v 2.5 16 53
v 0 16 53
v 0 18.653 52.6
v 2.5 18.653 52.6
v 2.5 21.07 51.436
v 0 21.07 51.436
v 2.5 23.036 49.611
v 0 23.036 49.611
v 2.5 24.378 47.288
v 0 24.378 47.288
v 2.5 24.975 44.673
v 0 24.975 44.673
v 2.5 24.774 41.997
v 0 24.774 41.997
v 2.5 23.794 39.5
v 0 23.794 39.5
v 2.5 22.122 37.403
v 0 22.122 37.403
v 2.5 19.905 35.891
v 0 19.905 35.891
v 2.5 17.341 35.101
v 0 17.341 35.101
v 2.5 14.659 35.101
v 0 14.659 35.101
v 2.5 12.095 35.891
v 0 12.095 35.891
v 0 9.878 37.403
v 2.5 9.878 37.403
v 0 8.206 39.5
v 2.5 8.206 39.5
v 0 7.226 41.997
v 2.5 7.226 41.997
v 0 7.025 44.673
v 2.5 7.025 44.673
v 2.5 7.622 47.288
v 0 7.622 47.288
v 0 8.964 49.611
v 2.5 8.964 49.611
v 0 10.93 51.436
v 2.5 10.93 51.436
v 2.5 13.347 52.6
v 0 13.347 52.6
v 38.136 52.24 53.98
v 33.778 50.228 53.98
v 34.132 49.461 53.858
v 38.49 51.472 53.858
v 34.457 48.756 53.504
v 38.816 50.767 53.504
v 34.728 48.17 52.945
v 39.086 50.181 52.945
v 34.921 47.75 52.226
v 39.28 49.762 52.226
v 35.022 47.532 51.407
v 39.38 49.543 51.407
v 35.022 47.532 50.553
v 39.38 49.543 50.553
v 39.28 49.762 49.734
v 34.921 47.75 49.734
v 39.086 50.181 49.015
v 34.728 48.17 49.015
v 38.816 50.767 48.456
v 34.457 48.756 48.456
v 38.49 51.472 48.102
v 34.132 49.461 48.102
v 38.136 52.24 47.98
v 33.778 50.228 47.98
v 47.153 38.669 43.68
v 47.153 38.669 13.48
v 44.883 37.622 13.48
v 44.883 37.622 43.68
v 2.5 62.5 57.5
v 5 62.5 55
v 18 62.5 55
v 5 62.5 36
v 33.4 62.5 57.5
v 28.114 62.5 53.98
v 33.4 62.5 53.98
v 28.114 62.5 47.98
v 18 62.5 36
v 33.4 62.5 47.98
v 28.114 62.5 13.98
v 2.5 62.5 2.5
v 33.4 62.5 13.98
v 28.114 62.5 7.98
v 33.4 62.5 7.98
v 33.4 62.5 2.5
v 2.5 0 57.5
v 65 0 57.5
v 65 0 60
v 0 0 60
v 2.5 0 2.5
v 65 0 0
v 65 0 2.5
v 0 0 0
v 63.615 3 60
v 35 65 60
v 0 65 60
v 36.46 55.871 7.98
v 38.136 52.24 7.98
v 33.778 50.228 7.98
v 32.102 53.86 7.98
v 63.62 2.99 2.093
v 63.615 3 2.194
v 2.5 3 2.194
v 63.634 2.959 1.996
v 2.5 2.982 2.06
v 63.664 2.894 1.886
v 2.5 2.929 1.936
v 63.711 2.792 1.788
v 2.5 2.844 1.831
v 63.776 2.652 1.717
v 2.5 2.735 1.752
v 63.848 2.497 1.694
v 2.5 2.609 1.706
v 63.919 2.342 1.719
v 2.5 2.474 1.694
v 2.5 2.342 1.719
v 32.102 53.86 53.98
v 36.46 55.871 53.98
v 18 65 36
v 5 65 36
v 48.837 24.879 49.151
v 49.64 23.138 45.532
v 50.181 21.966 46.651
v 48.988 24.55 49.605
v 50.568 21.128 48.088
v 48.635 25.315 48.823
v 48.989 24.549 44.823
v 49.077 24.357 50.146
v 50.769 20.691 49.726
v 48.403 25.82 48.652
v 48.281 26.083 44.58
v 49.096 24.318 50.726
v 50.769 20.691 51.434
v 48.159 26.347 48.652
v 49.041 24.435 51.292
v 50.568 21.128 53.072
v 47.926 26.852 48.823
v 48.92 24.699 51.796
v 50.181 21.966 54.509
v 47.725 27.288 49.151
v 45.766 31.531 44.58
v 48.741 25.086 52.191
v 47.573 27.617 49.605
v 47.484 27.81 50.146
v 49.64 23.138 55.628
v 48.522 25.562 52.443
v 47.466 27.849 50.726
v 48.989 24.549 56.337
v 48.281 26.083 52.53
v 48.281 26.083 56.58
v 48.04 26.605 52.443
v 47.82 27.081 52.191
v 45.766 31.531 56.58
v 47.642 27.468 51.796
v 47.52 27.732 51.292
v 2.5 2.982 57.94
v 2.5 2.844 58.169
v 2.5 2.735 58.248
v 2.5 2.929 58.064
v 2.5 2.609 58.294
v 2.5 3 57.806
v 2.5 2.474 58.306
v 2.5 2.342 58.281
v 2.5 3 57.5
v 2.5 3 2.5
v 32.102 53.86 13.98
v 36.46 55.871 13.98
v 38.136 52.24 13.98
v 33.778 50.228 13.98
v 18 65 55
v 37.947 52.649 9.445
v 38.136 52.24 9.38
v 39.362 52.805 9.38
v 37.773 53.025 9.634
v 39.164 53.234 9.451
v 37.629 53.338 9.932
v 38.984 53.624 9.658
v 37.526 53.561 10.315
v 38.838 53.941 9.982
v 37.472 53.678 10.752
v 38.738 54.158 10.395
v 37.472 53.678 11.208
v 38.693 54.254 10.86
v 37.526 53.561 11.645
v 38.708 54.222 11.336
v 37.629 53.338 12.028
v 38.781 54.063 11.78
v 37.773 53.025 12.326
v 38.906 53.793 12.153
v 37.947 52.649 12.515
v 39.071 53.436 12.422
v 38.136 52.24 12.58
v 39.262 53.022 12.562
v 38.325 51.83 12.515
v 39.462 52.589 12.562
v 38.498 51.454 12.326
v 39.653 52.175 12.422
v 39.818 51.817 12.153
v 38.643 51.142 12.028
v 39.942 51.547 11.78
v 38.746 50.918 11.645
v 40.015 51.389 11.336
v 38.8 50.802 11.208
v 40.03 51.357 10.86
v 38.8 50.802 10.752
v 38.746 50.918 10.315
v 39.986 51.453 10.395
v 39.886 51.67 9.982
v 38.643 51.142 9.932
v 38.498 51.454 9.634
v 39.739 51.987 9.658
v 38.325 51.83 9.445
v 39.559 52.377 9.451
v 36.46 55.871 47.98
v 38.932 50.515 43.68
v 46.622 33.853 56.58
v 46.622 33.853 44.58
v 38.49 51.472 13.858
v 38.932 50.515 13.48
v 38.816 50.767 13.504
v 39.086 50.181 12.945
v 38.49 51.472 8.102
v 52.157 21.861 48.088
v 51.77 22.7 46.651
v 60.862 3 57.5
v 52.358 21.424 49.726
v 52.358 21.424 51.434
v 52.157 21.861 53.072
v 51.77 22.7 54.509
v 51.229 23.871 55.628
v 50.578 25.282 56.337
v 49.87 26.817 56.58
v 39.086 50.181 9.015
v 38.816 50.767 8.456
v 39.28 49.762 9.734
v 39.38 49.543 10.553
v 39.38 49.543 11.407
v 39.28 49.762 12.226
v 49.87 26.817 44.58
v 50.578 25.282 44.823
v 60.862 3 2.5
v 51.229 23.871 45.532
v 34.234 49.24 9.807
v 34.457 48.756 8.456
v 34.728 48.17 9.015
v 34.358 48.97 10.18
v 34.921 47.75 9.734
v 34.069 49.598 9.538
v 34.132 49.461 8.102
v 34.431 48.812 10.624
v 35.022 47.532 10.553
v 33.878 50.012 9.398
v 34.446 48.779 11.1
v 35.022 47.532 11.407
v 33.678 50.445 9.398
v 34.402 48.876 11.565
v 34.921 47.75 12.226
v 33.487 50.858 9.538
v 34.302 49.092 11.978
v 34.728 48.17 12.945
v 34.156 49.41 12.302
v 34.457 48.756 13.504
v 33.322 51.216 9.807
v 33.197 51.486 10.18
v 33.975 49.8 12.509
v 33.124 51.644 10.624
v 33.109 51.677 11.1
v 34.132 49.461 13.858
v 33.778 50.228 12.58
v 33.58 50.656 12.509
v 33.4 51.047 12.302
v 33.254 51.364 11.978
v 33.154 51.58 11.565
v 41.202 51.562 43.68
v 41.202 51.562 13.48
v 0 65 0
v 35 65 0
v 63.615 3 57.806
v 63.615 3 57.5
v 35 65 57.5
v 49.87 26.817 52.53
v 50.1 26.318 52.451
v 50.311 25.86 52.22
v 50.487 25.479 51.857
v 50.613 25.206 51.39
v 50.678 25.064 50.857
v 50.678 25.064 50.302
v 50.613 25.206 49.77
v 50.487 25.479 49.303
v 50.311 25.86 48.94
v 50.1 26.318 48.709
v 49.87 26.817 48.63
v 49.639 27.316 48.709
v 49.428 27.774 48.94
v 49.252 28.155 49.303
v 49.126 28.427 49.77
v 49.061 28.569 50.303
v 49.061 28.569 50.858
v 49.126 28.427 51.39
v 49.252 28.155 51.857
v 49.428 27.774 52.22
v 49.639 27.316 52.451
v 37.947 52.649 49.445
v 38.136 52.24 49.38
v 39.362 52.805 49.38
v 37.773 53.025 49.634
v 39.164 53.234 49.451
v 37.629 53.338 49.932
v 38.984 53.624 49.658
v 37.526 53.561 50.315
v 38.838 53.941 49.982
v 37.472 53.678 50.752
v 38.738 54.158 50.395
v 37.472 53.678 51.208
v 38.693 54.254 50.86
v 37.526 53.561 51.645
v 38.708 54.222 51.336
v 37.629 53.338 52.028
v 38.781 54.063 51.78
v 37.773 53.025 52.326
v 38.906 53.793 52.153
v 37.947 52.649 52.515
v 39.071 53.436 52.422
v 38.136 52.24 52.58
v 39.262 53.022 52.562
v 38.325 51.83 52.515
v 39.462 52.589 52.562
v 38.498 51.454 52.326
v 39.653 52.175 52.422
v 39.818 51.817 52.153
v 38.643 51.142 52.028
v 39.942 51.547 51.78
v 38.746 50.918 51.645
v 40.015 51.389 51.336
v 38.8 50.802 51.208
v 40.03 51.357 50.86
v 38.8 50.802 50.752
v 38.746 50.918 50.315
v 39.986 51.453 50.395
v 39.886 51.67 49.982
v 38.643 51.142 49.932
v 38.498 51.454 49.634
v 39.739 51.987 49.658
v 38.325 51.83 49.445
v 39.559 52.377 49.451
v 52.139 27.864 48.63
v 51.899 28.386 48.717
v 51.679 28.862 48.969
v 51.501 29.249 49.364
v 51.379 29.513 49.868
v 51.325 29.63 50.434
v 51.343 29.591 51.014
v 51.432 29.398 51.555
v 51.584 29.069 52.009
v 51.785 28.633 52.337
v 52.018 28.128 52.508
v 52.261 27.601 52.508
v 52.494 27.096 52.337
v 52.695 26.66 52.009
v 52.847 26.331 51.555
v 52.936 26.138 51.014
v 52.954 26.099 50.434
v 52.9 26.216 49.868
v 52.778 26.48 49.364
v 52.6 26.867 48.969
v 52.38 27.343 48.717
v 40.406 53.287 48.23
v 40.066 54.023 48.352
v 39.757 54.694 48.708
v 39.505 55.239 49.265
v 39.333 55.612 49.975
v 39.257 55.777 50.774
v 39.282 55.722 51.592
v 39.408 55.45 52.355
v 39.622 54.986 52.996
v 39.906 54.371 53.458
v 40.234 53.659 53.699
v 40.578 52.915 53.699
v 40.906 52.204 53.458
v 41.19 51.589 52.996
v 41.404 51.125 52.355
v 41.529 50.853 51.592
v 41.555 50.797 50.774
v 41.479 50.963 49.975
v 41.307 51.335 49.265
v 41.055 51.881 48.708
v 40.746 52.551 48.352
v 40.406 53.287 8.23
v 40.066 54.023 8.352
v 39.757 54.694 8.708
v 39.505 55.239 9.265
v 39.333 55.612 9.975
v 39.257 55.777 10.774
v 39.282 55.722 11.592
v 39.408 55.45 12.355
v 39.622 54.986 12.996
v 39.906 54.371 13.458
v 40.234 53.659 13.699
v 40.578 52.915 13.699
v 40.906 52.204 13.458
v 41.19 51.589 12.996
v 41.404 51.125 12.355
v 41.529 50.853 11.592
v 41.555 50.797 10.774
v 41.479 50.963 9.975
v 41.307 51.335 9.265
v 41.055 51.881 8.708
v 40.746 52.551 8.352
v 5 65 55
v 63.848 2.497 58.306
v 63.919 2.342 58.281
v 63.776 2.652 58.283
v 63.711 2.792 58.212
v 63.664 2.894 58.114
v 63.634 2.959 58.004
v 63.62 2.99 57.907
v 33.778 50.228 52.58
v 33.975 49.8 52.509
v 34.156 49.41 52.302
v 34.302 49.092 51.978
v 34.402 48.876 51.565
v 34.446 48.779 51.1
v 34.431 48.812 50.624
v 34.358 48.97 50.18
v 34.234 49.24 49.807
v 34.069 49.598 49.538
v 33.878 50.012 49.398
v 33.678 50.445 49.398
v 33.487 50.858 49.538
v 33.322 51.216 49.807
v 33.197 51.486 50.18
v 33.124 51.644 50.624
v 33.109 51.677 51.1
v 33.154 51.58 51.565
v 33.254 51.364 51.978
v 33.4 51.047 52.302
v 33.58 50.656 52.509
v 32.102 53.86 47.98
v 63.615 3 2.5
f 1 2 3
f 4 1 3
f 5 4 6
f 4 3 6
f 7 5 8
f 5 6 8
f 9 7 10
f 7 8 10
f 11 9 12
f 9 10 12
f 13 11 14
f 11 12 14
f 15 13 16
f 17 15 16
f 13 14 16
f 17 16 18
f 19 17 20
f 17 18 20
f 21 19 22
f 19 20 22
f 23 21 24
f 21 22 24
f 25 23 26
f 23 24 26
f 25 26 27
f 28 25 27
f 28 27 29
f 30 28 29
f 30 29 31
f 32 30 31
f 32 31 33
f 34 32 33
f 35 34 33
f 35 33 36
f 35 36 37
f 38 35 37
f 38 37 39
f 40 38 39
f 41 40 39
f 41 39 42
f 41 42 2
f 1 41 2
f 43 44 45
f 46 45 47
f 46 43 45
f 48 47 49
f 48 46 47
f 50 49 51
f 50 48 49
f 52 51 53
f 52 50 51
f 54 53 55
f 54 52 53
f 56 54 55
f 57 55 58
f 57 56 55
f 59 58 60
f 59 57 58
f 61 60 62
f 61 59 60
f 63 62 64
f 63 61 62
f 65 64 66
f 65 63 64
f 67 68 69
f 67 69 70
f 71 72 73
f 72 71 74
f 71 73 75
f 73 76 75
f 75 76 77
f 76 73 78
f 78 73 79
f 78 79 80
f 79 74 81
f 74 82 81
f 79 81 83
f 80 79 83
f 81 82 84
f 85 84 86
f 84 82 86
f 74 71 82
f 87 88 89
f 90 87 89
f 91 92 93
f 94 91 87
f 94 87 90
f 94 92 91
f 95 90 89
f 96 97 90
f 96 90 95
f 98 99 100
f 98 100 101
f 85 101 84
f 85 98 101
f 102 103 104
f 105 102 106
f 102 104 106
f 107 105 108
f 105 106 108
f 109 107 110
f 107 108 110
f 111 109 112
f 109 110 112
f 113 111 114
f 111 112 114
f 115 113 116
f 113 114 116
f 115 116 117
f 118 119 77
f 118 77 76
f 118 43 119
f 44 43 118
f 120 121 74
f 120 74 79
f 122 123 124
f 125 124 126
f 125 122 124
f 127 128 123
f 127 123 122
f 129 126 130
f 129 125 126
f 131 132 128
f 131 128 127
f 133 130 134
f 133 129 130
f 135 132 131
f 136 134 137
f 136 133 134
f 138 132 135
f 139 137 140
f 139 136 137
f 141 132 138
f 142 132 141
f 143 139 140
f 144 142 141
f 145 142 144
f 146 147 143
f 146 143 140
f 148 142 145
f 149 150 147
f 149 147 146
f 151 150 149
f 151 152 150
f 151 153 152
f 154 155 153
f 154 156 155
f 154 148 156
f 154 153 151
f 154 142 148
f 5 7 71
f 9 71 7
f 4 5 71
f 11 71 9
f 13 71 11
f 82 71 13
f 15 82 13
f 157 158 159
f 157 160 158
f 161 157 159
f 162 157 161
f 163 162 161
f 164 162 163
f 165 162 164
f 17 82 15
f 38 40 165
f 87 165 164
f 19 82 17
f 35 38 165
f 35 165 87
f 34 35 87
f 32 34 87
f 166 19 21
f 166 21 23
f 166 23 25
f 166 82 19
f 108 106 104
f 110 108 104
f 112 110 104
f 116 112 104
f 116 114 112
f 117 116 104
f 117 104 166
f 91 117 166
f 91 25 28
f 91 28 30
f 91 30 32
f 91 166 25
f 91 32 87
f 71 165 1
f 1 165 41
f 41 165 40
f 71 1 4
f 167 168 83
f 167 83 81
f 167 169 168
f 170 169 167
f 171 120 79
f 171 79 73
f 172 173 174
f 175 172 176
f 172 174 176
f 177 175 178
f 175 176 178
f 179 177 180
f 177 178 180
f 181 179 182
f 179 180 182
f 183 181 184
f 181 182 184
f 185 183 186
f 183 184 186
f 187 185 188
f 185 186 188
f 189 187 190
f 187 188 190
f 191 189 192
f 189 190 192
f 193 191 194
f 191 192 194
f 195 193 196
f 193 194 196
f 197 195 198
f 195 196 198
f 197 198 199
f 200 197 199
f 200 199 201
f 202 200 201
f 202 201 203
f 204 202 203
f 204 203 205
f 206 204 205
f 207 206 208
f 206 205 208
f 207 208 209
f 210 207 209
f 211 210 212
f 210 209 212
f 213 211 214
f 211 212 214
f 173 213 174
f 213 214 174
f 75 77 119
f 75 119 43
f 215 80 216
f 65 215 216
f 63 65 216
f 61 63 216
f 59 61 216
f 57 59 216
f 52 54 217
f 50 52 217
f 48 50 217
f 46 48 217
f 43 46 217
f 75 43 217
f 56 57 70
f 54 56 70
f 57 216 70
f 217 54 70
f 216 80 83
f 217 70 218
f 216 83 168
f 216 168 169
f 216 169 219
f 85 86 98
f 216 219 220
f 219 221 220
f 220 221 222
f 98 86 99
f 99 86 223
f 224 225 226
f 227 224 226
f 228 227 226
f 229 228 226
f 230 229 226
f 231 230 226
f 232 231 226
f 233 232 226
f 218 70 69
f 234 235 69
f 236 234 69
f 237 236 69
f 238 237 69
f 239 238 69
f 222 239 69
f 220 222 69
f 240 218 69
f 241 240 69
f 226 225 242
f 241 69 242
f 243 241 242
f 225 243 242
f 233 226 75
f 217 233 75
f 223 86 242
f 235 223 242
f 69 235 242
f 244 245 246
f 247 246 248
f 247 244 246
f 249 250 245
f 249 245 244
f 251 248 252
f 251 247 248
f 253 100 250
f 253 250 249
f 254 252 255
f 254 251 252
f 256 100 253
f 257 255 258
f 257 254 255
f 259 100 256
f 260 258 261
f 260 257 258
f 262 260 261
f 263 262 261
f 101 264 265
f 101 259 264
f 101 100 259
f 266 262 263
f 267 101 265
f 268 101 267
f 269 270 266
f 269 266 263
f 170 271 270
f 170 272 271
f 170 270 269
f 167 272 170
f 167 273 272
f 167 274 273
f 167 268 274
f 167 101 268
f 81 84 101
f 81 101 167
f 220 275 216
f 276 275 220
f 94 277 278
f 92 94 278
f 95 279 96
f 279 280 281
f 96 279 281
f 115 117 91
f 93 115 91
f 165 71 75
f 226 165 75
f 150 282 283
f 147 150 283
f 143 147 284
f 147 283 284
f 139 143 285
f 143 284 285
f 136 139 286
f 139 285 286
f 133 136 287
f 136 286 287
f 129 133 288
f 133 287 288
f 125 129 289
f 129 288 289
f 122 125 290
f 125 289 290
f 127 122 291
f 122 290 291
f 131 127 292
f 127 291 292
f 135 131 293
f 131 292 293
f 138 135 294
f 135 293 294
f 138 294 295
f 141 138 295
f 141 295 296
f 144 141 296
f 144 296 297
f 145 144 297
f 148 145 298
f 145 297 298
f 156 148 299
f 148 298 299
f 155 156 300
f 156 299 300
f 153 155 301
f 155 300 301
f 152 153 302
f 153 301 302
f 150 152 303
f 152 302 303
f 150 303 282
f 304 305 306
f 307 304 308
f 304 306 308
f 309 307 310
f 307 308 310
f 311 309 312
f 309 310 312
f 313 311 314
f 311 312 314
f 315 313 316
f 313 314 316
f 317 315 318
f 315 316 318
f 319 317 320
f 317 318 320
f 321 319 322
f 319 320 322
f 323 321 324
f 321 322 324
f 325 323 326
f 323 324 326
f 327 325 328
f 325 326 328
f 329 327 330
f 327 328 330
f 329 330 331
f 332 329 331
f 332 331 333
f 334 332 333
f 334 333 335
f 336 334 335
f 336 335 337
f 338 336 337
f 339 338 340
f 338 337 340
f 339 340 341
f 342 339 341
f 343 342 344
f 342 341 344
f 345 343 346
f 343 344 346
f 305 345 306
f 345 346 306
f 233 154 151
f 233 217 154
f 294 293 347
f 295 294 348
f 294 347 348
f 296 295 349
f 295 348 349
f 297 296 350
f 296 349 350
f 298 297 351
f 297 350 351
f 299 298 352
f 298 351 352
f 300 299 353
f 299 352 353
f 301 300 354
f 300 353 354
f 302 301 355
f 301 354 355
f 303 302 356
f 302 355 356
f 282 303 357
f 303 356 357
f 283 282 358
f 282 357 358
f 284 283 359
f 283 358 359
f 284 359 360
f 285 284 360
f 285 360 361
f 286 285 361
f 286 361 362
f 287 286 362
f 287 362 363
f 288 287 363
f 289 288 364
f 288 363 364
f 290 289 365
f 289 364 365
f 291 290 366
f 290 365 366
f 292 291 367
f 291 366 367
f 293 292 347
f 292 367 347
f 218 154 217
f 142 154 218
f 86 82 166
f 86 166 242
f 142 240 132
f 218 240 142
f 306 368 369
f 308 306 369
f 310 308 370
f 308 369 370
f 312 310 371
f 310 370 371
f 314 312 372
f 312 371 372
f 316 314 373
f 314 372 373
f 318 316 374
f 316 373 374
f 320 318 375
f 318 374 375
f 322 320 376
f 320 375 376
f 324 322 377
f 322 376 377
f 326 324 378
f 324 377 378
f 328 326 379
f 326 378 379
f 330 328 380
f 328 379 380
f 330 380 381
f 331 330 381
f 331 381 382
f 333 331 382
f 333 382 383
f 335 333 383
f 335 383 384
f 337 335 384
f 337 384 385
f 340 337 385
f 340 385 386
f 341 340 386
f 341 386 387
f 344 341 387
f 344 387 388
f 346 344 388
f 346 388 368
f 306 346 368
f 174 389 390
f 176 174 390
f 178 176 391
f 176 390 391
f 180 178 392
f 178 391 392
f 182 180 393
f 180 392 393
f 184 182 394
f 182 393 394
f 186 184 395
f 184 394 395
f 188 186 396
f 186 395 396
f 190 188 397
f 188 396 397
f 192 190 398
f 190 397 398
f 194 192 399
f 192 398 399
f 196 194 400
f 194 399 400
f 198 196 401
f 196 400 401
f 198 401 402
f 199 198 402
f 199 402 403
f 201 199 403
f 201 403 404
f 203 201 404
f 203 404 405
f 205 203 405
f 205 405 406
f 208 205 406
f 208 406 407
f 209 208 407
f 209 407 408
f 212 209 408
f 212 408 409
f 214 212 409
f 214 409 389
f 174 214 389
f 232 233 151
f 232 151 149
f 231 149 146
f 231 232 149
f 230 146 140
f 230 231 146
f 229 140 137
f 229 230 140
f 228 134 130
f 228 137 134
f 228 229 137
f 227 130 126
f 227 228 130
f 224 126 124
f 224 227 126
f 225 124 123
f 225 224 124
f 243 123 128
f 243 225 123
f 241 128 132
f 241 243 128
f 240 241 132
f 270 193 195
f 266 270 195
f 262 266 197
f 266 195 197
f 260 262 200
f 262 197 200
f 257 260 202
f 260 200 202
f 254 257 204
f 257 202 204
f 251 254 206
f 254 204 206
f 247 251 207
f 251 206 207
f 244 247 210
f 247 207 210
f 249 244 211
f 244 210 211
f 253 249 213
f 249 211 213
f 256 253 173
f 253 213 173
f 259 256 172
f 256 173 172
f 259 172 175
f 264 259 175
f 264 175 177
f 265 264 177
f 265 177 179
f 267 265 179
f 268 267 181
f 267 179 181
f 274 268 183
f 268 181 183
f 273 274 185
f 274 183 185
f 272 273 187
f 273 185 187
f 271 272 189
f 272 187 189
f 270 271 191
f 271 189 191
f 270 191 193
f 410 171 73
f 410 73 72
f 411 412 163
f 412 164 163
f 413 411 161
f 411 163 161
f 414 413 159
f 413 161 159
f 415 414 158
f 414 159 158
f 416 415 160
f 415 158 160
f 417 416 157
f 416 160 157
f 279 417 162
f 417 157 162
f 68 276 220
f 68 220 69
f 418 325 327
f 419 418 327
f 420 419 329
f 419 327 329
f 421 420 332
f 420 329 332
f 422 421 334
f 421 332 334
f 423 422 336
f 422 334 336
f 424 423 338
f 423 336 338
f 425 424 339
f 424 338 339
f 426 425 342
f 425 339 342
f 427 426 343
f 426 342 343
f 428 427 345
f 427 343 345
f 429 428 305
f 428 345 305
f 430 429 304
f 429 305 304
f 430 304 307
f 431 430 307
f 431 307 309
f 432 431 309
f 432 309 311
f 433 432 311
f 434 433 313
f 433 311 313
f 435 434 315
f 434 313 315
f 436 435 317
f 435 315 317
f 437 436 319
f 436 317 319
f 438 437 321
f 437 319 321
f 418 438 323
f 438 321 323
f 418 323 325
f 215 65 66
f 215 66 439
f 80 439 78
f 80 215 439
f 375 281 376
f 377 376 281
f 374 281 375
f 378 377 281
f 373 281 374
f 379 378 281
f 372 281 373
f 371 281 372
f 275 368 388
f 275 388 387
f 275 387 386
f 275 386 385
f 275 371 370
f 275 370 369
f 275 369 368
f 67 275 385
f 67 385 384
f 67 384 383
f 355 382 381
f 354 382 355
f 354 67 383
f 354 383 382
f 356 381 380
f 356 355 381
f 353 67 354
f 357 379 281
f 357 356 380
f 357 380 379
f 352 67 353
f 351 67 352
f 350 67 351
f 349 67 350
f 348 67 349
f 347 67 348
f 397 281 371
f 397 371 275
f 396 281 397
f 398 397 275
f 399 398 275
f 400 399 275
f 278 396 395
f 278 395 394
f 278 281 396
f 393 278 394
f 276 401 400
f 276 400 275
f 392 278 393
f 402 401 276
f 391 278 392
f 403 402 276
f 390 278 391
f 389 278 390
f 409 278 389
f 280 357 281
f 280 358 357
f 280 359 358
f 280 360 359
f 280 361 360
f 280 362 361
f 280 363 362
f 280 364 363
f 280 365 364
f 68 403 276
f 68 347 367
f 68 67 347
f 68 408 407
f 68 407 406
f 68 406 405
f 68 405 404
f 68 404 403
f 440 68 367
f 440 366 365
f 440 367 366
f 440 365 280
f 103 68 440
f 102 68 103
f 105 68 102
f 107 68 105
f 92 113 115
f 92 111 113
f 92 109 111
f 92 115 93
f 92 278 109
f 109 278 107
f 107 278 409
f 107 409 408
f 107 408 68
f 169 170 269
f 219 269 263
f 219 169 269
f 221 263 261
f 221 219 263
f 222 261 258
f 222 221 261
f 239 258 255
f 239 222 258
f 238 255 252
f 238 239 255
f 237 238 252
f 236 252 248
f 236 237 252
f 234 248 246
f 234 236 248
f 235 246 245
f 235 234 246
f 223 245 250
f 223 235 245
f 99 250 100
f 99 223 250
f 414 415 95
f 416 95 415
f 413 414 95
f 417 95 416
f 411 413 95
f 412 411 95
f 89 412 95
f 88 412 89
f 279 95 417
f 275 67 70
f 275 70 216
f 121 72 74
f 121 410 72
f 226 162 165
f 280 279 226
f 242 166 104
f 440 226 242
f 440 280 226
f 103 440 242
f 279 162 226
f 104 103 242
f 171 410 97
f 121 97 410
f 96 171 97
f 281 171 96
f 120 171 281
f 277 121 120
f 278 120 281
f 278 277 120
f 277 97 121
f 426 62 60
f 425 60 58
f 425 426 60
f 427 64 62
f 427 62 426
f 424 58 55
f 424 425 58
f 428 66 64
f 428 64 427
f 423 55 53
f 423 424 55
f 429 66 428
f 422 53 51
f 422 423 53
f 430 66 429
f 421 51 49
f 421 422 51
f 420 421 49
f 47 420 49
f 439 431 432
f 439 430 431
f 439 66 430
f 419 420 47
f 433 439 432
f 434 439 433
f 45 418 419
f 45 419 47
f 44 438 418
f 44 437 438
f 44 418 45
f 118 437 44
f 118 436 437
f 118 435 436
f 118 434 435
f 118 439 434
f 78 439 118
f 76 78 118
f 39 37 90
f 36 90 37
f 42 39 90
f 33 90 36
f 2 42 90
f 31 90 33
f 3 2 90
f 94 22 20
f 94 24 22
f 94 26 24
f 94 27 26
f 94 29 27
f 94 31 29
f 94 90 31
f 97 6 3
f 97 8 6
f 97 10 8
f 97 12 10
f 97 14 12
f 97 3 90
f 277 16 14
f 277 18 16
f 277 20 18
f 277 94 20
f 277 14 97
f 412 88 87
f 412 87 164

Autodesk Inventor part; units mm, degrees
ref_plane "YZ Plane" through (0, 0, 0) normal (1, 0, 0) x (0, 1, 0)
ref_plane "XZ Plane" through (0, 0, 0) normal (0, 1, 0) x (-1, 0, 0)
sketch "Sketch1" plane through (0, 0, 0) normal (0, 0, 1) x (1, 0, 0)
  line L0 (0, 0) -> (0, 65)
  line L1 (0, 65) -> (35, 65)
  line L2 (35, 65) -> (65, 0)
  line L3 (65, 0) -> (0, 0)
  line L4 (35, 65) -> (19.5647, 57.876) construction
  line L5 (19.5647, 57.876) -> (40.0985, 13.386) construction
  line L6 (40.0985, 13.386) -> (55.5339, 20.51) construction
  line L7 (5, 65) -> (5, 39) construction
  line L8 (5, 39) -> (17.8, 39) construction
  line L9 (17.8, 39) -> (17.8, 65) construction
  line L10 (0, 23.6) -> (40, 23.6) construction
  line L11 (40, 23.6) -> (40, 6) construction
  line L12 (40, 6) -> (0, 6) construction
  line L13 (0, 26.5) -> (11, 26.5) construction
  line L14 (11, 26.5) -> (11, 23.6) construction
  line L15 (11, 6) -> (11, 3.1) construction
  line L16 (11, 3.1) -> (0, 3.1) construction
  dimension "d27" = 17
  dimension "d28" = 12.8
  dimension "d29" = 5
  dimension "d31" = 40
  dimension "d32" = 17.6
  dimension "d33" = 26
  dimension "d34" = 35
  dimension "d35" = 65
  dimension "d36" = 23.4
  dimension "d37" = 11
  dimension "d38" = 49
  dimension "d39" = 65
  dimension "d40" = 6
extrude "Extrusion1" add sketch "Sketch1" along normal blind 2.5
sketch "Sketch2" plane through (0, 0, 2.5) normal (0, 0, 1) x (1, 0, 0)
  line L0 (0, 65) -> (0, 0) projected
  line L1 (0, 0) -> (65, 0) projected
  line L2 (65, 0) -> (35, 65) projected
  line L3 (35, 65) -> (0, 65) projected
  line L4 (2.5, 2.5) -> (2.5, 62.5)
  line L5 (2.5, 62.5) -> (33.4004, 62.5)
  line L6 (33.4004, 62.5) -> (61.0927, 2.5)
  line L7 (61.0927, 2.5) -> (2.5, 2.5)
  line L8 (2.5, 2.5) -> (2.5, 0)
  line L9 (60.862, 3) -> (63.6154, 3)
  dimension "d2" = 2.5
  dimension "d3" = 3
extrude "Extrusion2" add sketch "Sketch2" along normal blind 55 contours L3 L2 L9 L6 L5 L4 L8 L1 L0
sketch "Sketch3" plane through (0, 0, 57.5) normal (0, 0, 1) x (1, 0, 0)
  line L0 (0, 65) -> (0, 0) projected
  line L1 (0, 0) -> (2.5, 0) projected
  line L2 (2.5, 0) -> (2.5, 62.5) projected
  line L3 (2.5, 62.5) -> (33.4004, 62.5) projected
  line L4 (33.4004, 62.5) -> (60.862, 3) projected
  line L5 (60.862, 3) -> (63.6154, 3) projected
  line L6 (63.6154, 3) -> (35, 65) projected
  line L7 (35, 65) -> (0, 65) projected
  line L8 (63.6154, 3) -> (65, 0)
  line L9 (65, 0) -> (2.5, 0)
extrude "Extrusion3" add sketch "Sketch3" along normal blind 2.5
sketch "Sketch4" plane through (0, 65, 0) normal (0, 1, 0) x (1, 0, 0)
  line L0 (5, -36) -> (18, -36)
  line L1 (18, -36) -> (18, -55)
  line L2 (18, -55) -> (5, -55)
  line L3 (5, -55) -> (5, -36)
  line L4 (0, 0) -> (0, -60) projected
  line L5 (35, -60) -> (0, -60) projected
  line L6 (4.1, -35.1) -> (18.9, -35.1) construction
  line L7 (18.9, -35.1) -> (18.9, -55.9) construction
  line L8 (18.9, -55.9) -> (4.1, -55.9) construction
  line L9 (4.1, -55.9) -> (4.1, -35.1) construction
  line L10 (5, -45.5) -> (4.1, -45.5) construction
  line L11 (18, -45.5) -> (18.9, -45.5) construction
  line L12 (11.5, -36) -> (11.5, -35.1) construction
  line L13 (11.5, -55) -> (11.5, -55.9) construction
  dimension "d41" = 13
  dimension "d42" = 19
  dimension "d43" = 14.8
  dimension "d44" = 20.8
  dimension "d45" = 5
  dimension "d46" = 5
extrude "Extrusion4" cut sketch "Sketch4" against normal through all
sketch "Sketch5" plane through (35, 65, 60) normal (0.9079594, 0.4190582, 0) x (0, 0, -1)
  line L0 (16.32, -14.8) -> (46.52, -14.8)
  line L1 (46.52, -14.8) -> (46.52, -29)
  line L2 (46.52, -29) -> (16.32, -29)
  line L3 (16.32, -29) -> (16.32, -14.8)
  circle A0 centre (9.42, -40.9) radius 1.95
  line L4 (60, -71.5891) -> (57.5, -71.5891) projected
  circle A1 centre (49.02, -12.9) radius 1.6
  circle A2 centre (9.02, -12.9) radius 1.6
  line L5 (9.02, -12.9) -> (49.02, -12.9) construction
  line L6 (60, 0) -> (0, 0) projected
  line L7 (3.5, -10) -> (53.82, -10) construction
  line L8 (53.82, -10) -> (53.82, -59.3) construction
  line L9 (53.82, -59.3) -> (3.5, -59.3) construction
  line L10 (3.5, -59.3) -> (3.5, -10) construction
  line L11 (0, -71.5891) -> (0, 0) projected
  point P0 (60, -44.3503)
  dimension "d17" = 40
  dimension "d18" = 3.2
  dimension "d19" = 30.2
  dimension "d20" = 14.2
  dimension "d47" = 2.5
  dimension "d48" = 1.9
  dimension "d49" = 28
  dimension "d50" = 39.6
  dimension "d51" = 50.32
  dimension "d52" = 4.8
  dimension "d53" = 49.3
  dimension "d54" = 2.9
  dimension "d55" = 10
  dimension "d72" = 3.5
  dimension "d73" = 3.9
extrude "Extrusion5" cut sketch "Sketch5" against normal up to next
sketch "Sketch6" plane through (0, 0, 0) normal (-1, 0, 0) x (0, 0, 1)
  circle A0 centre (44, 16) radius 9
  line L0 (0, 0) -> (60, 0) projected
  line L1 (60, 65) -> (60, 0) projected
  dimension "d56" = 18
  dimension "d57" = 7
  dimension "d58" = 7
extrude "Extrusion6" cut sketch "Sketch6" against normal up to next
ref_plane "Work Plane1" through (65, 0, 57.5) normal (1, 0, 0) x (0, 0, -1)
sketch "Sketch7" plane through (65, 0, 57.5) normal (1, 0, 0) x (0, 0, -1)
  line L0 (57.5, 65) -> (57.5, 0) projected
  line L1 (57.5, 65) -> (-2.5, 65) projected
  line L2 (-2.5, 0) -> (-2.5, 65) projected
  line L3 (0, 0) -> (-2.5, 0) projected
  line L4 (0, 0) -> (0, 3) projected
  line L5 (55, 3) -> (0, 3) projected
  line L6 (55, 0) -> (55, 3) projected
  line L7 (57.5, 0) -> (55, 0) projected
  line L8 (13.82, 38.6692) -> (13.82, 51.5622) projected
  line L9 (13.82, 51.5622) -> (44.02, 51.5622) projected
  line L10 (44.02, 51.5622) -> (44.02, 38.6692) projected
  line L11 (44.02, 38.6692) -> (13.82, 38.6692) projected
  ellipse E0 centre (6.92, 27.8645) end of major axis (4.97, 27.8645) minor radius 1.7705 projected
  line L12 (0, 0) -> (-1, 3)
  line L13 (-1, 3) -> (0, 3)
  line L14 (55, 3) -> (56, 3)
  line L15 (56, 3) -> (55, 0)
  dimension "d59" = 1
extrude "Extrusion7" cut sketch "Sketch7" against normal up to surface (62.5 mm away) contours L6 L14 L15 | L12 L13 L4
fillet "Fillet1" radius 0.5 2 edges at (33.0577, 3, 58.5) (33.0577, 3, 1.5)
sketch "Sketch8" plane through (60.862, 3, 2.5) normal (-0.9079594, -0.4190582, 0) x (0, 0, 1)
  circle A0 centre (8.48, 54.2311) radius 1.6 projected
  circle A1 centre (48.48, 54.2311) radius 1.6 projected
  arc A2 (45.48, 54.2311) -> (51.48, 54.2311) centre (48.48, 54.2311) ccw
  line L0 (10.98, 52.3311) -> (41.18, 52.3311) projected
  line L1 (5.48, 54.2311) -> (5.48, 58.2311)
  line L2 (11.48, 58.2311) -> (11.48, 54.2311)
  line L3 (45.48, 54.2311) -> (45.48, 58.2311)
  line L4 (51.48, 58.2311) -> (51.48, 54.2311)
  line L5 (0, 65.5316) -> (55, 65.5316) projected
  arc A3 (5.48, 54.2311) -> (11.48, 54.2311) centre (8.48, 54.2311) ccw
  line L6 (5.48, 58.2311) -> (11.48, 58.2311)
  line L7 (45.48, 58.2311) -> (51.48, 58.2311)
  point P0 (-2.5, 22.7808)
  point P1 (6.9, 65.5316)
  point P2 (12.9, 65.5316)
  point P3 (46.9, 65.5316)
  point P4 (52.9, 65.5316)
  dimension "d60" = 3
  dimension "d61" = 4
extrude "Extrusion8" add sketch "Sketch8" along normal blind 4.8
sketch "Sketch12" plane through (36.4597, 55.8715, 53.98) normal (-0.4190582, 0.9079594, 0) x (0.9079594, 0.4190582, 0)
  line L0 (0, 6) -> (0, 0) projected
  line L1 (0, 6) -> (-4.8, 6) projected
  line L2 (-4.8, 0) -> (-4.8, 6) projected
  line L3 (0, 0) -> (-4.8, 0) projected
  line L4 (0, 46) -> (0, 40) projected
  line L5 (0, 46) -> (-4.8, 46) projected
  line L6 (-4.8, 40) -> (-4.8, 46) projected
  line L7 (0, 40) -> (-4.8, 40) projected
  point P0 (-56.5174, 53.98)
extrude "Extrusion11" add sketch "Sketch12" along normal up to next
sketch "Sketch13" plane through (35, 65, 60) normal (0.9079594, 0.4190582, 0) x (0, 0, -1)
  circle A0 centre (49.02, -12.9) radius 1.6 projected
  circle A1 centre (9.02, -12.9) radius 1.6 projected
  point P0 (60, -44.3503)
hole "Hole1" at (40.4059, 53.2873, 50.98) at (40.4059, 53.2873, 10.98) direction (-0.9079594, -0.4190582, 0) diameter 3 depth 20 tip angle 118 countersink diameter 5.5 countersink angle 90
sketch "Sketch14" plane through (60.862, 3, 2.5) normal (-0.9079594, -0.4190582, 0) x (0, 0, 1)
  line L0 (55, 65.5316) -> (55, 0) projected
  line L1 (10.98, 52.3311) -> (41.18, 52.3311) projected
  circle A0 centre (48.08, 26.2311) radius 1.95 projected
  arc A1 (42.08, 26.2311) -> (54.08, 26.2311) centre (48.08, 26.2311) ccw
  line L2 (42.08, 26.2311) -> (42.08, 33.9811)
  line L3 (42.08, 33.9811) -> (54.08, 33.9811)
  line L4 (54.08, 33.9811) -> (54.08, 26.2311)
  arc A2 (54.08, 26.2311) -> (42.08, 26.2311) centre (48.08, 26.2311) ccw construction
  point P0 (-2.5, 22.7808)
  dimension "d71" = 12
  dimension "d80" = 1.75
extrude "Extrusion12" add sketch "Sketch14" along normal blind 1.75
chamfer "Chamfer1" distance 1.75 angle 45 1 edges at (45.033, 33.1201, 50.58)
properties part number "Caja temporizador"
